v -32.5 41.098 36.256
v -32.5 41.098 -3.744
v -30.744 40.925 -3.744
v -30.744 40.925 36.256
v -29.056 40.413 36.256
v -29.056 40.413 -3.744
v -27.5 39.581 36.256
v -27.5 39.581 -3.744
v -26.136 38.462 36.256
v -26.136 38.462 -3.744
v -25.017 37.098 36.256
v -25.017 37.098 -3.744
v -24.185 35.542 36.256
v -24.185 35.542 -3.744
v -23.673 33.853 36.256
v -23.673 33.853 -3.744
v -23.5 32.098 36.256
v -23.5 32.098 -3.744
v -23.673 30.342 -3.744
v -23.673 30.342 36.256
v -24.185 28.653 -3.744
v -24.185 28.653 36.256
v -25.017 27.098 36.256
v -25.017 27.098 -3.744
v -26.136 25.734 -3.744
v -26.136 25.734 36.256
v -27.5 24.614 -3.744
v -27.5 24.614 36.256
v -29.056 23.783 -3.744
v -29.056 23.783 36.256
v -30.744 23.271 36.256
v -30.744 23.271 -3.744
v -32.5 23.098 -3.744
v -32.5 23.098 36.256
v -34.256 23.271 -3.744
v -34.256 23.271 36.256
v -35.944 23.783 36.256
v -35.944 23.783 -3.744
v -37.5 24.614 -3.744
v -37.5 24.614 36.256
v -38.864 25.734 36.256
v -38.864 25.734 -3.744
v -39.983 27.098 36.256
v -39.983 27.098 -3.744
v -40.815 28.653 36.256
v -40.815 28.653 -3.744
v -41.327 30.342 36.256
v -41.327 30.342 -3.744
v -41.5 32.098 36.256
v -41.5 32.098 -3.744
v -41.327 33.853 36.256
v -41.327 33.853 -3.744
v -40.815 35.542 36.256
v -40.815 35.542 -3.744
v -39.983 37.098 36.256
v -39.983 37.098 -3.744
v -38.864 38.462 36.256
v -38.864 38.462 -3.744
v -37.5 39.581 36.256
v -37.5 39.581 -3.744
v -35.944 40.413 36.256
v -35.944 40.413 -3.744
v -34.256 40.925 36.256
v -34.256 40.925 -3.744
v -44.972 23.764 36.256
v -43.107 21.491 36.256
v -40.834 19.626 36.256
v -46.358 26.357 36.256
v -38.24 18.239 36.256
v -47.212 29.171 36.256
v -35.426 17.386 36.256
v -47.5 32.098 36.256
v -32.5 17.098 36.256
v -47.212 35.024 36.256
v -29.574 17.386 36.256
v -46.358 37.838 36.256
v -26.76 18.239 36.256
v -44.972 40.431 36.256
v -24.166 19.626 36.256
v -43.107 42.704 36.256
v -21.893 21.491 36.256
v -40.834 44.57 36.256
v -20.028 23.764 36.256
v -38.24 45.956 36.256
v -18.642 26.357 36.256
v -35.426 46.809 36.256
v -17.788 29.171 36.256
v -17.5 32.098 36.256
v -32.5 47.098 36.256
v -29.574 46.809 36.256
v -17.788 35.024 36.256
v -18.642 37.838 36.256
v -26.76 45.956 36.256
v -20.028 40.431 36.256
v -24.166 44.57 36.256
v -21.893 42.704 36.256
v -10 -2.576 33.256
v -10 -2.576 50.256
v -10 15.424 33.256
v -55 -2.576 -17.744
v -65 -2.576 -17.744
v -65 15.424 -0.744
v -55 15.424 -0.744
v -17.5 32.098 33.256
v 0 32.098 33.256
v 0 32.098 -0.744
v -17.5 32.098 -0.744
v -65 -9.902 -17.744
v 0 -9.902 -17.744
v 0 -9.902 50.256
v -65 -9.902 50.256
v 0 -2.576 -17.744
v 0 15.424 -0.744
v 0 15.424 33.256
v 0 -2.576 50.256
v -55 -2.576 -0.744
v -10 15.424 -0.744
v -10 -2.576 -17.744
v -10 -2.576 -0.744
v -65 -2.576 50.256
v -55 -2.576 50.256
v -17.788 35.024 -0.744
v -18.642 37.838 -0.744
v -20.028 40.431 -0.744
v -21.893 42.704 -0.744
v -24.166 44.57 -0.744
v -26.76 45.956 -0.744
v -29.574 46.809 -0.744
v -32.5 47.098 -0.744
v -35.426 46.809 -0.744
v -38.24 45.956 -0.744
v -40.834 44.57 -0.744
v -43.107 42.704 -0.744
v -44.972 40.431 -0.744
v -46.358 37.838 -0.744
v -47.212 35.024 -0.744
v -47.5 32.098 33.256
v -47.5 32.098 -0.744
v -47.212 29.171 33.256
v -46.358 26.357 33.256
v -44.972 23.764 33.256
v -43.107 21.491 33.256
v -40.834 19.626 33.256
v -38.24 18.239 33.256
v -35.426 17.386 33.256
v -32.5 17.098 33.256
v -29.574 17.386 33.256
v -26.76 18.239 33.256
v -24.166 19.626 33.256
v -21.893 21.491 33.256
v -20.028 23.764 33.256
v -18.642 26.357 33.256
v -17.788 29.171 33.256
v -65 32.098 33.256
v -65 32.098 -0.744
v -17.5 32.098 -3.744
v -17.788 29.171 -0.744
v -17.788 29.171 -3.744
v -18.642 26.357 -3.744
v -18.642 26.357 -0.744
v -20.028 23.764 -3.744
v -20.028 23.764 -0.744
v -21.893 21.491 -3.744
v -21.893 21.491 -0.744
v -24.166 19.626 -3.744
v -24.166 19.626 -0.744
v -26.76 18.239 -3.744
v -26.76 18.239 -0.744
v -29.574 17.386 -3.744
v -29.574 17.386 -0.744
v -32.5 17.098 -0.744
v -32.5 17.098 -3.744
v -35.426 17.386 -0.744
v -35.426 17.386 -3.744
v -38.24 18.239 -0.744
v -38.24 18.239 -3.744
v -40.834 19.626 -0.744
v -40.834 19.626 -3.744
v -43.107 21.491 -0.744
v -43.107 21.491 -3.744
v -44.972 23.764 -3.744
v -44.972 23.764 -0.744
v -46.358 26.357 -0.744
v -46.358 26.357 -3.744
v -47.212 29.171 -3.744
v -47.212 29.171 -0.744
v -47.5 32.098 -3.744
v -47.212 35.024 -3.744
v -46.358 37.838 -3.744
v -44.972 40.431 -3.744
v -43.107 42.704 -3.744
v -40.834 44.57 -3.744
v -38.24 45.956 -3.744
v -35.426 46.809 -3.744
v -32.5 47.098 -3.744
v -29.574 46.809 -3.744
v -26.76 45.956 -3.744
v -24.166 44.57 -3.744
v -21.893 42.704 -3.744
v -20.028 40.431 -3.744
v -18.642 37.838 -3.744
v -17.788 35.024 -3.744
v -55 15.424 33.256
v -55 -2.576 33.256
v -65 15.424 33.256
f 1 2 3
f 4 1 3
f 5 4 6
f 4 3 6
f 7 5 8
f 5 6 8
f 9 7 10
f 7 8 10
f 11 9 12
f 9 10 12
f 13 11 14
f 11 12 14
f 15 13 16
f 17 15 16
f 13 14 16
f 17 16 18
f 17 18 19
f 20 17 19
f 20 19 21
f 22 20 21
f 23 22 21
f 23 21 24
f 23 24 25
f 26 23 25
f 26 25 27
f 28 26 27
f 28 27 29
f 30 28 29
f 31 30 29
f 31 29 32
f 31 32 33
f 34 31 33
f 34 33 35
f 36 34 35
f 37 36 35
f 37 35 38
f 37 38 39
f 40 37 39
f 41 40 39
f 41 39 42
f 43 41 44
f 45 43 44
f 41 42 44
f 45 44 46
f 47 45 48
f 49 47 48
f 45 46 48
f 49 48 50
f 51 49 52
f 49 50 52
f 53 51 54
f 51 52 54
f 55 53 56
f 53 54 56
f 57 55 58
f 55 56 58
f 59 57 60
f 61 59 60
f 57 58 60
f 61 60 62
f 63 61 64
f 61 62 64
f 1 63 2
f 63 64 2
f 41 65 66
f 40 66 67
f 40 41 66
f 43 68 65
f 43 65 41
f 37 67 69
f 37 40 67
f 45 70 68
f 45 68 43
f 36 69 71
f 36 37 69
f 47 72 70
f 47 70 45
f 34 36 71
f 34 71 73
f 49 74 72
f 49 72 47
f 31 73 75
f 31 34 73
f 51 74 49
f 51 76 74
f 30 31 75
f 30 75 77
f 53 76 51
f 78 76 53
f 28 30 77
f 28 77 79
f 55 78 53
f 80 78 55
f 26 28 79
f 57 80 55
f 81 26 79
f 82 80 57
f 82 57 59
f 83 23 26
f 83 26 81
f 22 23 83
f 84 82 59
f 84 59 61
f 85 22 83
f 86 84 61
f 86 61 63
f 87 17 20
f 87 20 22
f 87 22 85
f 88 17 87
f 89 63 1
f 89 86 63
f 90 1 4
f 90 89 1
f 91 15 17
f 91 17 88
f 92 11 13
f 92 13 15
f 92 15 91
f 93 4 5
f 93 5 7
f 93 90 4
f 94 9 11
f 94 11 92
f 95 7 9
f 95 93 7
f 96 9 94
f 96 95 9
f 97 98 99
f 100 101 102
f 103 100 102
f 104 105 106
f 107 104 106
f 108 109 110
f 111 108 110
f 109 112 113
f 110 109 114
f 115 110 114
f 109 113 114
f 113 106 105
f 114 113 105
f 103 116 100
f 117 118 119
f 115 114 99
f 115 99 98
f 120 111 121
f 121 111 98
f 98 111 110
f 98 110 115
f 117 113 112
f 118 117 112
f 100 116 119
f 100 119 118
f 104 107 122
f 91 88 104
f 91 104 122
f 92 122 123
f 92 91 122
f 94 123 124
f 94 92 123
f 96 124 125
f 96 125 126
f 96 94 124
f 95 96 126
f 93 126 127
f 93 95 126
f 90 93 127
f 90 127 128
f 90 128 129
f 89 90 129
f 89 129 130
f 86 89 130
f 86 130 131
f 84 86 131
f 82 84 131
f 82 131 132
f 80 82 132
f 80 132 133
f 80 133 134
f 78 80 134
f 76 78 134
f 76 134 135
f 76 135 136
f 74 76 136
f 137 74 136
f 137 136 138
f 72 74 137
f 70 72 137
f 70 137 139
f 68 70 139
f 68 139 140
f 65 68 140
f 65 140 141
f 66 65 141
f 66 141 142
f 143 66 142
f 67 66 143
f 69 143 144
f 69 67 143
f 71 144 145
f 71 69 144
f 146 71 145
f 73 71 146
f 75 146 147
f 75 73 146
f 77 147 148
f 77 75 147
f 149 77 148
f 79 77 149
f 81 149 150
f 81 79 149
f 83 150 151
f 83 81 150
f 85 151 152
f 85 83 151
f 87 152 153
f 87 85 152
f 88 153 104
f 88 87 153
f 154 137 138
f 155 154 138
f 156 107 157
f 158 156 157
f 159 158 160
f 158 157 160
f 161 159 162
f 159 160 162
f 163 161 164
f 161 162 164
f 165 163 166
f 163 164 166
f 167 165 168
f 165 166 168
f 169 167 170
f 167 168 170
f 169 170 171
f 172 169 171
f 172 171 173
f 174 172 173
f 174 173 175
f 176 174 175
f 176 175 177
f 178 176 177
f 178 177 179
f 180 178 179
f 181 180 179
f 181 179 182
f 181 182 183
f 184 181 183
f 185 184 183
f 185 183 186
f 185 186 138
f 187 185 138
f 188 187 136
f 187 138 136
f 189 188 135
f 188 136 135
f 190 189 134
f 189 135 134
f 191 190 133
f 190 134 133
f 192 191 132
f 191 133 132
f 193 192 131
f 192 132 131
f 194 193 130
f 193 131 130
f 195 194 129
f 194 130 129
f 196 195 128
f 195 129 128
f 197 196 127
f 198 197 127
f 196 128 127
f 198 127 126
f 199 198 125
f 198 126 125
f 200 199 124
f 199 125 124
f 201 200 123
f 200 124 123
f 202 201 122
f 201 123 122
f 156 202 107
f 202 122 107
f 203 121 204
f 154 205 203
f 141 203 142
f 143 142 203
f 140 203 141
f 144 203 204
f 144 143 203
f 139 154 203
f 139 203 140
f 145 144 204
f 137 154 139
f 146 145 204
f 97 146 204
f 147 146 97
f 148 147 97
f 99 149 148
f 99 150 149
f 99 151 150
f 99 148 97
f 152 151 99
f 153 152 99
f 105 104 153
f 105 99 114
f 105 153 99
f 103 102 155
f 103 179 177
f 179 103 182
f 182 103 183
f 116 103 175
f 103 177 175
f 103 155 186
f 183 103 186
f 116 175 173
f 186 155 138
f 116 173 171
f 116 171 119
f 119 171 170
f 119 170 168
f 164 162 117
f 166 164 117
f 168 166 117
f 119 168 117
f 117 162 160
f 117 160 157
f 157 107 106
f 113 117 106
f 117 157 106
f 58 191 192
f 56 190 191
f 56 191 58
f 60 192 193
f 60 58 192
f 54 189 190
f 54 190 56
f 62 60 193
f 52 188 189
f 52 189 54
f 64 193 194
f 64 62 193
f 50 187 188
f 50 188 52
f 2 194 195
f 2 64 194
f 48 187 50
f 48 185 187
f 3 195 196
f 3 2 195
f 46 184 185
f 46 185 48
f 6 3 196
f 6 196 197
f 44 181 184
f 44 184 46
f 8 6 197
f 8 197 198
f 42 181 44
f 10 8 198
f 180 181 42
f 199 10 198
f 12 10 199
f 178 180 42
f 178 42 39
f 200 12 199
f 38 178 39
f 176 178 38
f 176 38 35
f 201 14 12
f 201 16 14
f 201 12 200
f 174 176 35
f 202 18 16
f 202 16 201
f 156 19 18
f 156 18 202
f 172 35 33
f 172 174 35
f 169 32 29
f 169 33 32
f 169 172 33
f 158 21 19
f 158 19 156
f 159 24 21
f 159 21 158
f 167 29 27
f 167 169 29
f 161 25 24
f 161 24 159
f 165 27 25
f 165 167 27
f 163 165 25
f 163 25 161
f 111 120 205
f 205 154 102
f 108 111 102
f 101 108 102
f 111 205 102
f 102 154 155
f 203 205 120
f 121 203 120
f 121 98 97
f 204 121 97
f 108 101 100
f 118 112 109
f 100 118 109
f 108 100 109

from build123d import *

# Parameters (mm, degrees)
BOSS_EXTRUDE1_DEPTH = 65
BOSS_EXTRUDE2_DEPTH = 10
BOSS_EXTRUDE3_DEPTH = 10
BOSS_EXTRUDE4_DEPTH = 10
BOSS_EXTRUDE5_DEPTH = 10
SKETCH6_R           = 15
BOSS_EXTRUDE6_DEPTH = 34
BOSS_EXTRUDE7_START = 3
SKETCH7_R           = 15
BOSS_EXTRUDE7_DEPTH = 3
SKETCH8_R           = 15
BOSS_EXTRUDE8_DEPTH = 3
CUT_EXTRUDE1_REACH  = 98.743
SKETCH9_R           = 9


with BuildPart() as part:
    # Sketch1 → Boss-Extrude1 (new body)
    with BuildSketch(Plane(origin=(0, 0, 0), x_dir=(0, 0, -1), z_dir=(1, 0, 0))):
        Polygon((-50.255892256, -9.902356902), (-50.255892256, -2.575757576), (-33.255892256, -2.575757576), (-33.255892256, 32.097643098), (0.744107744, 32.097643098), (0.744107744, -2.575757576), (17.744107744, -2.575757576), (17.744107744, -9.902356902), align=None)
    extrude(amount=-BOSS_EXTRUDE1_DEPTH)

    # Sketch2 → Boss-Extrude2 (add)
    with BuildSketch(Plane(origin=(0, 0, 0), x_dir=(0, 0, -1), z_dir=(1, 0, 0))):
        Polygon((-33.255892256, 15.424242424), (-50.255892256, -2.575757576), (-33.255892256, -2.575757576), align=None)
    extrude(amount=-BOSS_EXTRUDE2_DEPTH)

    # Sketch3 → Boss-Extrude3 (add)
    with BuildSketch(Plane.ZY.offset(65)):
        Polygon((33.255892256, 15.424242424), (50.255892256, -2.575757576), (33.255892256, -2.575757576), align=None)
    extrude(amount=-BOSS_EXTRUDE3_DEPTH)

    # Sketch4 → Boss-Extrude4 (add)
    with BuildSketch(Plane.ZY.offset(65)):
        Polygon((-17.744107744, -2.575757576), (-0.744107744, 15.424242424), (-0.744107744, -2.575757576), align=None)
    extrude(amount=-BOSS_EXTRUDE4_DEPTH)

    # Sketch5 → Boss-Extrude5 (add)
    with BuildSketch(Plane(origin=(0, 0, 0), x_dir=(0, 0, -1), z_dir=(1, 0, 0))):
        Polygon((0.744107744, 15.424242424), (17.744107744, -2.575757576), (0.744107744, -2.575757576), align=None)
    extrude(amount=-BOSS_EXTRUDE5_DEPTH)

    # Sketch6 → Boss-Extrude6 (add)
    with BuildSketch(Plane.XY.offset(33.255892256)):
        with Locations((-32.5, 32.097643098)):
            Circle(SKETCH6_R)
    extrude(amount=-BOSS_EXTRUDE6_DEPTH)

    # Sketch7 → Boss-Extrude7 (add)
    with BuildSketch(Plane.XY.offset(33.255892256).offset(BOSS_EXTRUDE7_START)):
        with Locations((-32.5, 32.097643098)):
            Circle(SKETCH7_R)
    extrude(amount=-BOSS_EXTRUDE7_DEPTH)

    # Sketch8 → Boss-Extrude8 (add)
    with BuildSketch(Plane(origin=(0, 0, -0.744107744), x_dir=(-1, 0, 0), z_dir=(0, 0, -1))):
        with Locations(Location((32.5, 32.097643098, 0), (0, 0, 180))):
            Circle(SKETCH8_R)
    extrude(amount=BOSS_EXTRUDE8_DEPTH)

    # Sketch9 → Cut-Extrude1 (cut, up to next)
    with BuildSketch(Plane(origin=(0, 0, -3.744107744), x_dir=(-1, 0, 0), z_dir=(0, 0, -1)), mode=Mode.PRIVATE) as cut_extrude1_sk1:
        with Locations(Location((32.5, 32.097643098, 0), (0, 0, 90))):
            Circle(SKETCH9_R)
    cut_extrude1_tool1 = extrude(cut_extrude1_sk1.sketch, amount=-CUT_EXTRUDE1_REACH, mode=Mode.PRIVATE) & part.part
    add(cut_extrude1_tool1.solids().sort_by_distance((-32.5, 32.097643, -3.744108))[0], mode=Mode.SUBTRACT)


solid = part.part
